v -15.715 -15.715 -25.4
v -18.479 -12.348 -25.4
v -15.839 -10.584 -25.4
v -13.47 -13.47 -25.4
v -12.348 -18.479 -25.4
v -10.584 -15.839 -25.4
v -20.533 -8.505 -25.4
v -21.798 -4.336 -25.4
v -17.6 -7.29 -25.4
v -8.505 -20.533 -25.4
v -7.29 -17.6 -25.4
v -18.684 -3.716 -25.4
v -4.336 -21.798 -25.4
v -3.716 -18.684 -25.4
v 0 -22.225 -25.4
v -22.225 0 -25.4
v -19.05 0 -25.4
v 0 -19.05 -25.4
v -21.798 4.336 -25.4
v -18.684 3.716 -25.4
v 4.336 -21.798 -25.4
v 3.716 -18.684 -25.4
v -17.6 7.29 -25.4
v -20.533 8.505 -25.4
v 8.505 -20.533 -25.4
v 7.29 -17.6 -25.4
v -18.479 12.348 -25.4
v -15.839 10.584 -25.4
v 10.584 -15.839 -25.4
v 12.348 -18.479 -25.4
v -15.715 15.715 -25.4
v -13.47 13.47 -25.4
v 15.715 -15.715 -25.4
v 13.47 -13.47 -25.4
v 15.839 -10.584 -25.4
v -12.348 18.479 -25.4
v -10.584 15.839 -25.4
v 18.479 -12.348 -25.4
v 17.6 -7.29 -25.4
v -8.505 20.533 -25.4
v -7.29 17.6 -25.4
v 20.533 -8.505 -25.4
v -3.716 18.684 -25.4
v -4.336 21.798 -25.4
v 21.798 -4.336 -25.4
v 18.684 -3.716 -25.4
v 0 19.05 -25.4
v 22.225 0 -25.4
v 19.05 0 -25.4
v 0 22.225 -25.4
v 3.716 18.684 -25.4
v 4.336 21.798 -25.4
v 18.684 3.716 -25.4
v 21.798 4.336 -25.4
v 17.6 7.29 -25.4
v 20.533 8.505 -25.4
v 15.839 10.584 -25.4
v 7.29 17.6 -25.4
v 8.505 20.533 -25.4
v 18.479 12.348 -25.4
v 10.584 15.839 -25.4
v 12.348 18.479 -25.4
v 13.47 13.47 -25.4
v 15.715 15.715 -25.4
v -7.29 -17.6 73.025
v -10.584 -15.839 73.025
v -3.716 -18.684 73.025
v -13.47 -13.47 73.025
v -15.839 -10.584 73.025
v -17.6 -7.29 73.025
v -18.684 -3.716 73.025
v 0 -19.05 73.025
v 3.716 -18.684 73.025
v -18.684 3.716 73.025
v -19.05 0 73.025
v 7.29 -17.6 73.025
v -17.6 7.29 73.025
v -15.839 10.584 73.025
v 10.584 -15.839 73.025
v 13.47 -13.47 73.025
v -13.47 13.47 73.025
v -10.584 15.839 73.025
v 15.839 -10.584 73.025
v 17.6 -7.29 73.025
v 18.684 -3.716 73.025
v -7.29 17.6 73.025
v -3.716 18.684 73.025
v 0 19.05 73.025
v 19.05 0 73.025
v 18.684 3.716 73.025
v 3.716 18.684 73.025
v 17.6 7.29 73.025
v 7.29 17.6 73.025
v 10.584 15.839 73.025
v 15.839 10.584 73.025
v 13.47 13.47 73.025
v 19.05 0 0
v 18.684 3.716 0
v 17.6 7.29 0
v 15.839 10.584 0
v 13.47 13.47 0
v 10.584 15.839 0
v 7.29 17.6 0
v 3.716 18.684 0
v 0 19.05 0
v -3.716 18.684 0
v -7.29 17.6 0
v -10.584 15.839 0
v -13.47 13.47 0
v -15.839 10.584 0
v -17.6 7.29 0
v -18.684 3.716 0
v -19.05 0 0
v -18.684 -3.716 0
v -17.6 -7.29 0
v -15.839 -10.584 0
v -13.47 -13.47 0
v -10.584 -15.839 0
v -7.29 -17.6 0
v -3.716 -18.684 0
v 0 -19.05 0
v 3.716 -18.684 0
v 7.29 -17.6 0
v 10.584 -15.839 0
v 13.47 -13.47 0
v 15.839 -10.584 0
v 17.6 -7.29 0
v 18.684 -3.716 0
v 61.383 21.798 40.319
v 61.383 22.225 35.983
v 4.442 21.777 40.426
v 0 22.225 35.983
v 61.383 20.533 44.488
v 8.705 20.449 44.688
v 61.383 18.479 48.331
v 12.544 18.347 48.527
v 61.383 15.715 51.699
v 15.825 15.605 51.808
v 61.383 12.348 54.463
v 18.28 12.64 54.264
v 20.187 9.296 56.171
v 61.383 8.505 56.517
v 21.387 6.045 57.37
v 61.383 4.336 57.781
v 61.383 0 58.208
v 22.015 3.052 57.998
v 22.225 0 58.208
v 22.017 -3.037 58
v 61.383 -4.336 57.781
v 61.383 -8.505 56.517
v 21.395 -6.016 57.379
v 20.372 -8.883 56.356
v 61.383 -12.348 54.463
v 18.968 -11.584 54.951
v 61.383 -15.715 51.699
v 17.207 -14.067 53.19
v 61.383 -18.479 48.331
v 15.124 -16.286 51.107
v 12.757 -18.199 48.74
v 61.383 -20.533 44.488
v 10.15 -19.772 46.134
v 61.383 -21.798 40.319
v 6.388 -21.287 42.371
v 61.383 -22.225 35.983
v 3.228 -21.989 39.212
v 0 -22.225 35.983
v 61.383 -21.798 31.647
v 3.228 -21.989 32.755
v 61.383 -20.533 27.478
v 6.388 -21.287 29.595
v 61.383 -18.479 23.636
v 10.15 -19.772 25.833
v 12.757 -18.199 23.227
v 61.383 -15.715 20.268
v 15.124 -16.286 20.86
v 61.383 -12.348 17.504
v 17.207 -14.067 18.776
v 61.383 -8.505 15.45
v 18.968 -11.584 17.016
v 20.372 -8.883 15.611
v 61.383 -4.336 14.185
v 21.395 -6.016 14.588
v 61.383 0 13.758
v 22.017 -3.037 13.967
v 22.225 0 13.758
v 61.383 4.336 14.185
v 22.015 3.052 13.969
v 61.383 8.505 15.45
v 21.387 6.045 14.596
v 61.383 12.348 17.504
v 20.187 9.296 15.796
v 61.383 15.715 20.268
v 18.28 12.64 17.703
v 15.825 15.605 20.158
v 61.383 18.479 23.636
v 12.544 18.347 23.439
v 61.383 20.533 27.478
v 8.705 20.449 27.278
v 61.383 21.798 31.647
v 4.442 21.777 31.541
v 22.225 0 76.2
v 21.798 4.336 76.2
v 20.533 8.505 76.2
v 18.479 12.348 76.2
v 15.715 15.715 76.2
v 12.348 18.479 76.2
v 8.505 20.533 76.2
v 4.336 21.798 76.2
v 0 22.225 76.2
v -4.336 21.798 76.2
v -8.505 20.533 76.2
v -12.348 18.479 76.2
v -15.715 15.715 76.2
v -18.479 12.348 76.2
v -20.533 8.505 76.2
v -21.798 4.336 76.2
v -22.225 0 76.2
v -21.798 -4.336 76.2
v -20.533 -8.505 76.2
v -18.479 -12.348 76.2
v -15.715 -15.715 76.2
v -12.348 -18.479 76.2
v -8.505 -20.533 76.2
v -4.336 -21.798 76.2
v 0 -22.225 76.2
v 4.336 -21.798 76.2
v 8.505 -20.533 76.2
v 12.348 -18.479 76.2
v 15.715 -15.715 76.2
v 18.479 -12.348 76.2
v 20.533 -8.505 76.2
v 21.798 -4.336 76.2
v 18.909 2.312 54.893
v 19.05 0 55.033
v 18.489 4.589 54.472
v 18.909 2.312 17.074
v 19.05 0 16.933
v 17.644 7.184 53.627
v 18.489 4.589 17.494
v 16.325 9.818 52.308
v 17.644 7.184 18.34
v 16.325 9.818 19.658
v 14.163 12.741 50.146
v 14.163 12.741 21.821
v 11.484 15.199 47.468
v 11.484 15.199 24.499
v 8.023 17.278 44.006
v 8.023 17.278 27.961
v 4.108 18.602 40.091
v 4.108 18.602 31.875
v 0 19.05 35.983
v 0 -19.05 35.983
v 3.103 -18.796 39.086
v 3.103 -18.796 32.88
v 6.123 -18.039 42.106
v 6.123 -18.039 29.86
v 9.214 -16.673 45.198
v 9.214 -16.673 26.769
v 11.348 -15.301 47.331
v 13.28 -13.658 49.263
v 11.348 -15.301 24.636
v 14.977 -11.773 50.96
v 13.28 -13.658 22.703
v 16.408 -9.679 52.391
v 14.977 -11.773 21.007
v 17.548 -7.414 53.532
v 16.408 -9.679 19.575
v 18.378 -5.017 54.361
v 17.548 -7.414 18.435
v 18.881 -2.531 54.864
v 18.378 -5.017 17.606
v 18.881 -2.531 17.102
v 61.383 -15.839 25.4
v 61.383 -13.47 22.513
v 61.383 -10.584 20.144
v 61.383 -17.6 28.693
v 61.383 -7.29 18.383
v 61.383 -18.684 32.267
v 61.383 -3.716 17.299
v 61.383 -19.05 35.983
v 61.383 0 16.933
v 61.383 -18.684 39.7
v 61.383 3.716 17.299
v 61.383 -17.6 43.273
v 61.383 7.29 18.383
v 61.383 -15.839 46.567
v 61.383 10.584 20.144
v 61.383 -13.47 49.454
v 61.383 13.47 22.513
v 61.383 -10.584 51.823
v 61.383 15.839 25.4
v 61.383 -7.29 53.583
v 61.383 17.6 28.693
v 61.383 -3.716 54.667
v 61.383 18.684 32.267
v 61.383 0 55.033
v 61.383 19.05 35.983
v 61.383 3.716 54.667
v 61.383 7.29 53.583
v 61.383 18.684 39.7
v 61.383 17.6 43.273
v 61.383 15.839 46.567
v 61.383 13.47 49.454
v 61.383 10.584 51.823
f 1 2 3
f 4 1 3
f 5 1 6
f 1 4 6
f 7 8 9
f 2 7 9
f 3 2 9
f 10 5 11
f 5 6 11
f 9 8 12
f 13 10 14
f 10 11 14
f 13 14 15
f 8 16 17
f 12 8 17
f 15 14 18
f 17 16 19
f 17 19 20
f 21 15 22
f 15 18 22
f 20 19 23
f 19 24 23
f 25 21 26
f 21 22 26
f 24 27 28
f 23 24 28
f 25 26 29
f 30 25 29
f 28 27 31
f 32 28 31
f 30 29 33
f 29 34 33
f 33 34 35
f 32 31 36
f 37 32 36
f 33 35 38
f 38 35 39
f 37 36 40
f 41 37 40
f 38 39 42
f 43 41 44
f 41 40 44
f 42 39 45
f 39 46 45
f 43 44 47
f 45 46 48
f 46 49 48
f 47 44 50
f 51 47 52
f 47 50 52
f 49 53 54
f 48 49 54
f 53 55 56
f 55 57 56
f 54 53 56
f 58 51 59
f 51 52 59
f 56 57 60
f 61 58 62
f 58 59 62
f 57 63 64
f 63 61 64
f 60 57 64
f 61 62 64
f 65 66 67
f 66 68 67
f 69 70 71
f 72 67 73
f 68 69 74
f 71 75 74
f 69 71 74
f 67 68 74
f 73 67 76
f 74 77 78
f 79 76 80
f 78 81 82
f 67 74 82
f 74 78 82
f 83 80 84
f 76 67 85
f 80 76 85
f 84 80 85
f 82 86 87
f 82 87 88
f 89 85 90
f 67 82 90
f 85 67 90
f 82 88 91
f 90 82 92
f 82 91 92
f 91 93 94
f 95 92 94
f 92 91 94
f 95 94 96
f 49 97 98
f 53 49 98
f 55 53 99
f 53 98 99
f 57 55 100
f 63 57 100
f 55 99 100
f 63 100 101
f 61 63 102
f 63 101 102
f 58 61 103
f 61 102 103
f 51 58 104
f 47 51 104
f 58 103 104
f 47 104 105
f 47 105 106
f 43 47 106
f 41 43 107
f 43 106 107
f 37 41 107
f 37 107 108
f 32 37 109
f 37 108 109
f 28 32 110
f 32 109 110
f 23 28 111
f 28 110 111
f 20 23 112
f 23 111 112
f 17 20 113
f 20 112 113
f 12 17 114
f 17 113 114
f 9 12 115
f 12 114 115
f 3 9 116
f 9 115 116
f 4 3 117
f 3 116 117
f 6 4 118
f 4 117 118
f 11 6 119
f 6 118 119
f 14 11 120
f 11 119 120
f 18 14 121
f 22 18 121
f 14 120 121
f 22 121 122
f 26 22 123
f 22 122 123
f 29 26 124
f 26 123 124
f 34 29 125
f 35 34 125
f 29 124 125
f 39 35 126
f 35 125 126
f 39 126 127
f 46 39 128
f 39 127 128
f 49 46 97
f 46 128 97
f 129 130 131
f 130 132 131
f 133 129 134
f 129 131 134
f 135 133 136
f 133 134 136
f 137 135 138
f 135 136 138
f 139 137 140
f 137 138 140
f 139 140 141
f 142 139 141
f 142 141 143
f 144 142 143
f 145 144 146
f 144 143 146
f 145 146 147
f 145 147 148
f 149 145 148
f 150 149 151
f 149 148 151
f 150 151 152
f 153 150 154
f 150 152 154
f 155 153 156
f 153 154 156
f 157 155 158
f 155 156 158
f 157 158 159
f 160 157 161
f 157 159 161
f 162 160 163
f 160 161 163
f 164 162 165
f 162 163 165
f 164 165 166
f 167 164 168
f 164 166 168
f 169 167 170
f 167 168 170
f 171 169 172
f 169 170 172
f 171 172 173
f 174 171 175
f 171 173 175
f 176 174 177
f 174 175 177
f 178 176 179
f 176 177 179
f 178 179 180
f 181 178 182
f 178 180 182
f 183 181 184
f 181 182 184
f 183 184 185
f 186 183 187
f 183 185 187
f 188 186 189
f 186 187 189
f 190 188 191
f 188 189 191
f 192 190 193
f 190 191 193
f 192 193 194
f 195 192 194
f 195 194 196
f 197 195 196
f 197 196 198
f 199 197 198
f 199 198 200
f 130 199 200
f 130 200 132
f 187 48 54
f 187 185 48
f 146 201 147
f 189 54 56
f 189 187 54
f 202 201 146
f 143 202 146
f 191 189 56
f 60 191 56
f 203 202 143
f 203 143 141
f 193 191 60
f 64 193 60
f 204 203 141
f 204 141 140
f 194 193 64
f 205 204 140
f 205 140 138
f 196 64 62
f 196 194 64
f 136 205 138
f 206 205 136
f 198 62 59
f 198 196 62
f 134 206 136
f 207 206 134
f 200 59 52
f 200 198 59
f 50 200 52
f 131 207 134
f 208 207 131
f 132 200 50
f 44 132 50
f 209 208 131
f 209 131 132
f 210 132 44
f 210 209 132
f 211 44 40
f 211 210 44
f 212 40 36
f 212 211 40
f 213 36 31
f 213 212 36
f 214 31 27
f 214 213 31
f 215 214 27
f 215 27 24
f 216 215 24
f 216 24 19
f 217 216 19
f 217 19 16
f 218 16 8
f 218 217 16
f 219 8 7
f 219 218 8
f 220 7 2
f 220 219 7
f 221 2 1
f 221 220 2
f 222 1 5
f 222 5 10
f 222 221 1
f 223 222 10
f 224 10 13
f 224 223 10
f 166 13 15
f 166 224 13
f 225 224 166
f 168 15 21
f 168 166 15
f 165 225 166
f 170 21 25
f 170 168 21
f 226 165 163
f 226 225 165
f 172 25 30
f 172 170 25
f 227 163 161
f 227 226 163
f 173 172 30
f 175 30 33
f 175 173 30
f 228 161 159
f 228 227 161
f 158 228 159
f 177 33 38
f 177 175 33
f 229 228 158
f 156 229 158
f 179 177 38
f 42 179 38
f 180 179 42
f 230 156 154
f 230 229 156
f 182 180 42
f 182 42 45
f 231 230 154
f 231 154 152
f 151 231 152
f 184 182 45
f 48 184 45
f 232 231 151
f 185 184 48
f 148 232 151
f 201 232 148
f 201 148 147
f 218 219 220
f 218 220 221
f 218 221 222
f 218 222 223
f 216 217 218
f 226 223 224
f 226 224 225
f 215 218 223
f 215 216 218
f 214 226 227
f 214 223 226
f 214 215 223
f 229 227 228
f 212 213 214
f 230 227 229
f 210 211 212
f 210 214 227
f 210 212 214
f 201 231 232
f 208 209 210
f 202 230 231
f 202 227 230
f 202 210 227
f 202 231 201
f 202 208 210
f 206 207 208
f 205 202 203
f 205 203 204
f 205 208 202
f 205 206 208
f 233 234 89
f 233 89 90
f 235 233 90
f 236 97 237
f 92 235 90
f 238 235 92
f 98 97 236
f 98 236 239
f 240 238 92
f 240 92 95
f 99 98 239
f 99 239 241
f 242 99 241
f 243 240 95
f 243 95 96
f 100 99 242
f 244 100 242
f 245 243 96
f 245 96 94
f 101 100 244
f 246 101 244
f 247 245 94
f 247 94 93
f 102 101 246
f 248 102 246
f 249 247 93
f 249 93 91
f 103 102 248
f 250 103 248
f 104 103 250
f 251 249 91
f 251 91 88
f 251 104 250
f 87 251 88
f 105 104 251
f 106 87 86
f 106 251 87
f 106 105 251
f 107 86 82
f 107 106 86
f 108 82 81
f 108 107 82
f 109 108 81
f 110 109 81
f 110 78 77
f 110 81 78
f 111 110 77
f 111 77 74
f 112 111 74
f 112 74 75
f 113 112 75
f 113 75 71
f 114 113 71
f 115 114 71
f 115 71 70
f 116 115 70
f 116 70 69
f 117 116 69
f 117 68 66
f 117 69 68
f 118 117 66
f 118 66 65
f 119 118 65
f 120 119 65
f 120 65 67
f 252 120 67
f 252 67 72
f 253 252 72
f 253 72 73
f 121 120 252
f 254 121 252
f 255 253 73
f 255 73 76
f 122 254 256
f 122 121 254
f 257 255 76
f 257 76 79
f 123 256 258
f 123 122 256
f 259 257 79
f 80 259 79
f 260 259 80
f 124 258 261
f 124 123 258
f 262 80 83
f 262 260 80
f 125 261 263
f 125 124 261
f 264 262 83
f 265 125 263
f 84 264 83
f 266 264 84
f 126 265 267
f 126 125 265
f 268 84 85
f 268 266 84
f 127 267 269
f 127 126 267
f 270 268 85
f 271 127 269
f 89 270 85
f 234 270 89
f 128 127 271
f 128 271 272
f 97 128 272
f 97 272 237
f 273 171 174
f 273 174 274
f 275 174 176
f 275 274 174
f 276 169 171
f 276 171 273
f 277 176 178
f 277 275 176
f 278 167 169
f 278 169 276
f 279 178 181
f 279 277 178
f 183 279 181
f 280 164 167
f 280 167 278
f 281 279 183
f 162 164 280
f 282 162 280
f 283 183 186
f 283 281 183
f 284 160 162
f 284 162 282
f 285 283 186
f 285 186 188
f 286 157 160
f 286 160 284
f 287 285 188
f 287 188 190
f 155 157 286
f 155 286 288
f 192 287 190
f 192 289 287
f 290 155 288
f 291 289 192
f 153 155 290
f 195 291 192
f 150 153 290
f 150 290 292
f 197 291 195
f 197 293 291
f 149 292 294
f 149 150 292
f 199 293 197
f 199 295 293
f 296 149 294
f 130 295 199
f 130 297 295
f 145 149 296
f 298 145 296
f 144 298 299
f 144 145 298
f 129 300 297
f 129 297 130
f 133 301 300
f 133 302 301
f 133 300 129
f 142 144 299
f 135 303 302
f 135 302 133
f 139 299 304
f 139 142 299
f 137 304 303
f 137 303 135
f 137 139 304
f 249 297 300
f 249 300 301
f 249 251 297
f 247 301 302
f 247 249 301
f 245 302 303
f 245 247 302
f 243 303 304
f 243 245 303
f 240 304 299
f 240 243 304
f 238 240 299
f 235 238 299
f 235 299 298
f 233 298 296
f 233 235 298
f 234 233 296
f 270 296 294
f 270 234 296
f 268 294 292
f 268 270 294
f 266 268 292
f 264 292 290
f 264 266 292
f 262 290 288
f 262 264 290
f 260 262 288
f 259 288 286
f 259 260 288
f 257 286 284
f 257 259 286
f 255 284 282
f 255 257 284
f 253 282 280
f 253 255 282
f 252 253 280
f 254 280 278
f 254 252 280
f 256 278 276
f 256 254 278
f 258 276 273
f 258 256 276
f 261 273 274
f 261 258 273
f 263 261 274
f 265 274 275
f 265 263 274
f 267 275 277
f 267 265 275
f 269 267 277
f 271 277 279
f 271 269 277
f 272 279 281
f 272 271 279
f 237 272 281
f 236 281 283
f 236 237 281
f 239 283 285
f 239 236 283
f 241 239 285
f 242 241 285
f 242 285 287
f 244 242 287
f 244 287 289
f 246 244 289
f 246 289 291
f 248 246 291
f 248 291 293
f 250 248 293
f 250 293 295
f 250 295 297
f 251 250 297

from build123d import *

# Parameters (mm, degrees)
F0_R     = 22.225
F0_R_2   = 19.05
F1_DEPTH = 76.2
F2_START = 73.025
F2_DEPTH = 3.175
F3_R     = 22.225
F3_R_2   = 19.05
F4_DEPTH = 35.9833333333
F5_DEPTH = 63.5
F6_DEPTH = 25.4
F7_DEPTH = 25.4
F8_DEPTH = 25.4


with BuildPart() as f1:
    # F0 (on Top) → F1 (new body)
    with BuildSketch(Plane.XY):
        Circle(F0_R)
        Circle(F0_R_2, mode=Mode.SUBTRACT)
    extrude(amount=F1_DEPTH)

    # F0 (on Top) → F2 (join)
    with BuildSketch(Plane.XY.offset(F2_START)):
        Circle(F0_R)
        Circle(F0_R_2, mode=Mode.SUBTRACT)
        Circle(F0_R_2)
    extrude(amount=F2_DEPTH)

    # F3 (on Right) → F4 (join)
    with BuildSketch(Plane.YZ):
        with Locations((0, 35.9833333333)):
            Circle(F3_R)
        with Locations((0, 35.9833333333)):
            Circle(F3_R_2, mode=Mode.SUBTRACT)
    extrude(amount=F4_DEPTH)

    # F0 (on Top) → F5 (cut)
    with BuildSketch(Plane.XY):
        Circle(F0_R_2)
    extrude(amount=F5_DEPTH, mode=Mode.SUBTRACT)

    # F3 (on Right) → F6 (cut)
    with BuildSketch(Plane.YZ):
        with Locations((0, 35.9833333333)):
            Circle(F3_R_2)
    extrude(amount=F6_DEPTH, mode=Mode.SUBTRACT)

    # F7 (add): a face of the model
    f7_faces = [f1.faces().sort_by_distance(p)[0] for p in [
        (35.9833333333, -21.5963820715, 35.9833333333),
    ]]
    extrude(f7_faces, amount=F7_DEPTH)

    # F8 (add): a face of the model
    f8_faces = [f1.faces().sort_by_distance(p)[0] for p in [
        (-21.5963820715, 0, 0),
    ]]
    extrude(f8_faces, amount=F8_DEPTH)


solid = f1.part
